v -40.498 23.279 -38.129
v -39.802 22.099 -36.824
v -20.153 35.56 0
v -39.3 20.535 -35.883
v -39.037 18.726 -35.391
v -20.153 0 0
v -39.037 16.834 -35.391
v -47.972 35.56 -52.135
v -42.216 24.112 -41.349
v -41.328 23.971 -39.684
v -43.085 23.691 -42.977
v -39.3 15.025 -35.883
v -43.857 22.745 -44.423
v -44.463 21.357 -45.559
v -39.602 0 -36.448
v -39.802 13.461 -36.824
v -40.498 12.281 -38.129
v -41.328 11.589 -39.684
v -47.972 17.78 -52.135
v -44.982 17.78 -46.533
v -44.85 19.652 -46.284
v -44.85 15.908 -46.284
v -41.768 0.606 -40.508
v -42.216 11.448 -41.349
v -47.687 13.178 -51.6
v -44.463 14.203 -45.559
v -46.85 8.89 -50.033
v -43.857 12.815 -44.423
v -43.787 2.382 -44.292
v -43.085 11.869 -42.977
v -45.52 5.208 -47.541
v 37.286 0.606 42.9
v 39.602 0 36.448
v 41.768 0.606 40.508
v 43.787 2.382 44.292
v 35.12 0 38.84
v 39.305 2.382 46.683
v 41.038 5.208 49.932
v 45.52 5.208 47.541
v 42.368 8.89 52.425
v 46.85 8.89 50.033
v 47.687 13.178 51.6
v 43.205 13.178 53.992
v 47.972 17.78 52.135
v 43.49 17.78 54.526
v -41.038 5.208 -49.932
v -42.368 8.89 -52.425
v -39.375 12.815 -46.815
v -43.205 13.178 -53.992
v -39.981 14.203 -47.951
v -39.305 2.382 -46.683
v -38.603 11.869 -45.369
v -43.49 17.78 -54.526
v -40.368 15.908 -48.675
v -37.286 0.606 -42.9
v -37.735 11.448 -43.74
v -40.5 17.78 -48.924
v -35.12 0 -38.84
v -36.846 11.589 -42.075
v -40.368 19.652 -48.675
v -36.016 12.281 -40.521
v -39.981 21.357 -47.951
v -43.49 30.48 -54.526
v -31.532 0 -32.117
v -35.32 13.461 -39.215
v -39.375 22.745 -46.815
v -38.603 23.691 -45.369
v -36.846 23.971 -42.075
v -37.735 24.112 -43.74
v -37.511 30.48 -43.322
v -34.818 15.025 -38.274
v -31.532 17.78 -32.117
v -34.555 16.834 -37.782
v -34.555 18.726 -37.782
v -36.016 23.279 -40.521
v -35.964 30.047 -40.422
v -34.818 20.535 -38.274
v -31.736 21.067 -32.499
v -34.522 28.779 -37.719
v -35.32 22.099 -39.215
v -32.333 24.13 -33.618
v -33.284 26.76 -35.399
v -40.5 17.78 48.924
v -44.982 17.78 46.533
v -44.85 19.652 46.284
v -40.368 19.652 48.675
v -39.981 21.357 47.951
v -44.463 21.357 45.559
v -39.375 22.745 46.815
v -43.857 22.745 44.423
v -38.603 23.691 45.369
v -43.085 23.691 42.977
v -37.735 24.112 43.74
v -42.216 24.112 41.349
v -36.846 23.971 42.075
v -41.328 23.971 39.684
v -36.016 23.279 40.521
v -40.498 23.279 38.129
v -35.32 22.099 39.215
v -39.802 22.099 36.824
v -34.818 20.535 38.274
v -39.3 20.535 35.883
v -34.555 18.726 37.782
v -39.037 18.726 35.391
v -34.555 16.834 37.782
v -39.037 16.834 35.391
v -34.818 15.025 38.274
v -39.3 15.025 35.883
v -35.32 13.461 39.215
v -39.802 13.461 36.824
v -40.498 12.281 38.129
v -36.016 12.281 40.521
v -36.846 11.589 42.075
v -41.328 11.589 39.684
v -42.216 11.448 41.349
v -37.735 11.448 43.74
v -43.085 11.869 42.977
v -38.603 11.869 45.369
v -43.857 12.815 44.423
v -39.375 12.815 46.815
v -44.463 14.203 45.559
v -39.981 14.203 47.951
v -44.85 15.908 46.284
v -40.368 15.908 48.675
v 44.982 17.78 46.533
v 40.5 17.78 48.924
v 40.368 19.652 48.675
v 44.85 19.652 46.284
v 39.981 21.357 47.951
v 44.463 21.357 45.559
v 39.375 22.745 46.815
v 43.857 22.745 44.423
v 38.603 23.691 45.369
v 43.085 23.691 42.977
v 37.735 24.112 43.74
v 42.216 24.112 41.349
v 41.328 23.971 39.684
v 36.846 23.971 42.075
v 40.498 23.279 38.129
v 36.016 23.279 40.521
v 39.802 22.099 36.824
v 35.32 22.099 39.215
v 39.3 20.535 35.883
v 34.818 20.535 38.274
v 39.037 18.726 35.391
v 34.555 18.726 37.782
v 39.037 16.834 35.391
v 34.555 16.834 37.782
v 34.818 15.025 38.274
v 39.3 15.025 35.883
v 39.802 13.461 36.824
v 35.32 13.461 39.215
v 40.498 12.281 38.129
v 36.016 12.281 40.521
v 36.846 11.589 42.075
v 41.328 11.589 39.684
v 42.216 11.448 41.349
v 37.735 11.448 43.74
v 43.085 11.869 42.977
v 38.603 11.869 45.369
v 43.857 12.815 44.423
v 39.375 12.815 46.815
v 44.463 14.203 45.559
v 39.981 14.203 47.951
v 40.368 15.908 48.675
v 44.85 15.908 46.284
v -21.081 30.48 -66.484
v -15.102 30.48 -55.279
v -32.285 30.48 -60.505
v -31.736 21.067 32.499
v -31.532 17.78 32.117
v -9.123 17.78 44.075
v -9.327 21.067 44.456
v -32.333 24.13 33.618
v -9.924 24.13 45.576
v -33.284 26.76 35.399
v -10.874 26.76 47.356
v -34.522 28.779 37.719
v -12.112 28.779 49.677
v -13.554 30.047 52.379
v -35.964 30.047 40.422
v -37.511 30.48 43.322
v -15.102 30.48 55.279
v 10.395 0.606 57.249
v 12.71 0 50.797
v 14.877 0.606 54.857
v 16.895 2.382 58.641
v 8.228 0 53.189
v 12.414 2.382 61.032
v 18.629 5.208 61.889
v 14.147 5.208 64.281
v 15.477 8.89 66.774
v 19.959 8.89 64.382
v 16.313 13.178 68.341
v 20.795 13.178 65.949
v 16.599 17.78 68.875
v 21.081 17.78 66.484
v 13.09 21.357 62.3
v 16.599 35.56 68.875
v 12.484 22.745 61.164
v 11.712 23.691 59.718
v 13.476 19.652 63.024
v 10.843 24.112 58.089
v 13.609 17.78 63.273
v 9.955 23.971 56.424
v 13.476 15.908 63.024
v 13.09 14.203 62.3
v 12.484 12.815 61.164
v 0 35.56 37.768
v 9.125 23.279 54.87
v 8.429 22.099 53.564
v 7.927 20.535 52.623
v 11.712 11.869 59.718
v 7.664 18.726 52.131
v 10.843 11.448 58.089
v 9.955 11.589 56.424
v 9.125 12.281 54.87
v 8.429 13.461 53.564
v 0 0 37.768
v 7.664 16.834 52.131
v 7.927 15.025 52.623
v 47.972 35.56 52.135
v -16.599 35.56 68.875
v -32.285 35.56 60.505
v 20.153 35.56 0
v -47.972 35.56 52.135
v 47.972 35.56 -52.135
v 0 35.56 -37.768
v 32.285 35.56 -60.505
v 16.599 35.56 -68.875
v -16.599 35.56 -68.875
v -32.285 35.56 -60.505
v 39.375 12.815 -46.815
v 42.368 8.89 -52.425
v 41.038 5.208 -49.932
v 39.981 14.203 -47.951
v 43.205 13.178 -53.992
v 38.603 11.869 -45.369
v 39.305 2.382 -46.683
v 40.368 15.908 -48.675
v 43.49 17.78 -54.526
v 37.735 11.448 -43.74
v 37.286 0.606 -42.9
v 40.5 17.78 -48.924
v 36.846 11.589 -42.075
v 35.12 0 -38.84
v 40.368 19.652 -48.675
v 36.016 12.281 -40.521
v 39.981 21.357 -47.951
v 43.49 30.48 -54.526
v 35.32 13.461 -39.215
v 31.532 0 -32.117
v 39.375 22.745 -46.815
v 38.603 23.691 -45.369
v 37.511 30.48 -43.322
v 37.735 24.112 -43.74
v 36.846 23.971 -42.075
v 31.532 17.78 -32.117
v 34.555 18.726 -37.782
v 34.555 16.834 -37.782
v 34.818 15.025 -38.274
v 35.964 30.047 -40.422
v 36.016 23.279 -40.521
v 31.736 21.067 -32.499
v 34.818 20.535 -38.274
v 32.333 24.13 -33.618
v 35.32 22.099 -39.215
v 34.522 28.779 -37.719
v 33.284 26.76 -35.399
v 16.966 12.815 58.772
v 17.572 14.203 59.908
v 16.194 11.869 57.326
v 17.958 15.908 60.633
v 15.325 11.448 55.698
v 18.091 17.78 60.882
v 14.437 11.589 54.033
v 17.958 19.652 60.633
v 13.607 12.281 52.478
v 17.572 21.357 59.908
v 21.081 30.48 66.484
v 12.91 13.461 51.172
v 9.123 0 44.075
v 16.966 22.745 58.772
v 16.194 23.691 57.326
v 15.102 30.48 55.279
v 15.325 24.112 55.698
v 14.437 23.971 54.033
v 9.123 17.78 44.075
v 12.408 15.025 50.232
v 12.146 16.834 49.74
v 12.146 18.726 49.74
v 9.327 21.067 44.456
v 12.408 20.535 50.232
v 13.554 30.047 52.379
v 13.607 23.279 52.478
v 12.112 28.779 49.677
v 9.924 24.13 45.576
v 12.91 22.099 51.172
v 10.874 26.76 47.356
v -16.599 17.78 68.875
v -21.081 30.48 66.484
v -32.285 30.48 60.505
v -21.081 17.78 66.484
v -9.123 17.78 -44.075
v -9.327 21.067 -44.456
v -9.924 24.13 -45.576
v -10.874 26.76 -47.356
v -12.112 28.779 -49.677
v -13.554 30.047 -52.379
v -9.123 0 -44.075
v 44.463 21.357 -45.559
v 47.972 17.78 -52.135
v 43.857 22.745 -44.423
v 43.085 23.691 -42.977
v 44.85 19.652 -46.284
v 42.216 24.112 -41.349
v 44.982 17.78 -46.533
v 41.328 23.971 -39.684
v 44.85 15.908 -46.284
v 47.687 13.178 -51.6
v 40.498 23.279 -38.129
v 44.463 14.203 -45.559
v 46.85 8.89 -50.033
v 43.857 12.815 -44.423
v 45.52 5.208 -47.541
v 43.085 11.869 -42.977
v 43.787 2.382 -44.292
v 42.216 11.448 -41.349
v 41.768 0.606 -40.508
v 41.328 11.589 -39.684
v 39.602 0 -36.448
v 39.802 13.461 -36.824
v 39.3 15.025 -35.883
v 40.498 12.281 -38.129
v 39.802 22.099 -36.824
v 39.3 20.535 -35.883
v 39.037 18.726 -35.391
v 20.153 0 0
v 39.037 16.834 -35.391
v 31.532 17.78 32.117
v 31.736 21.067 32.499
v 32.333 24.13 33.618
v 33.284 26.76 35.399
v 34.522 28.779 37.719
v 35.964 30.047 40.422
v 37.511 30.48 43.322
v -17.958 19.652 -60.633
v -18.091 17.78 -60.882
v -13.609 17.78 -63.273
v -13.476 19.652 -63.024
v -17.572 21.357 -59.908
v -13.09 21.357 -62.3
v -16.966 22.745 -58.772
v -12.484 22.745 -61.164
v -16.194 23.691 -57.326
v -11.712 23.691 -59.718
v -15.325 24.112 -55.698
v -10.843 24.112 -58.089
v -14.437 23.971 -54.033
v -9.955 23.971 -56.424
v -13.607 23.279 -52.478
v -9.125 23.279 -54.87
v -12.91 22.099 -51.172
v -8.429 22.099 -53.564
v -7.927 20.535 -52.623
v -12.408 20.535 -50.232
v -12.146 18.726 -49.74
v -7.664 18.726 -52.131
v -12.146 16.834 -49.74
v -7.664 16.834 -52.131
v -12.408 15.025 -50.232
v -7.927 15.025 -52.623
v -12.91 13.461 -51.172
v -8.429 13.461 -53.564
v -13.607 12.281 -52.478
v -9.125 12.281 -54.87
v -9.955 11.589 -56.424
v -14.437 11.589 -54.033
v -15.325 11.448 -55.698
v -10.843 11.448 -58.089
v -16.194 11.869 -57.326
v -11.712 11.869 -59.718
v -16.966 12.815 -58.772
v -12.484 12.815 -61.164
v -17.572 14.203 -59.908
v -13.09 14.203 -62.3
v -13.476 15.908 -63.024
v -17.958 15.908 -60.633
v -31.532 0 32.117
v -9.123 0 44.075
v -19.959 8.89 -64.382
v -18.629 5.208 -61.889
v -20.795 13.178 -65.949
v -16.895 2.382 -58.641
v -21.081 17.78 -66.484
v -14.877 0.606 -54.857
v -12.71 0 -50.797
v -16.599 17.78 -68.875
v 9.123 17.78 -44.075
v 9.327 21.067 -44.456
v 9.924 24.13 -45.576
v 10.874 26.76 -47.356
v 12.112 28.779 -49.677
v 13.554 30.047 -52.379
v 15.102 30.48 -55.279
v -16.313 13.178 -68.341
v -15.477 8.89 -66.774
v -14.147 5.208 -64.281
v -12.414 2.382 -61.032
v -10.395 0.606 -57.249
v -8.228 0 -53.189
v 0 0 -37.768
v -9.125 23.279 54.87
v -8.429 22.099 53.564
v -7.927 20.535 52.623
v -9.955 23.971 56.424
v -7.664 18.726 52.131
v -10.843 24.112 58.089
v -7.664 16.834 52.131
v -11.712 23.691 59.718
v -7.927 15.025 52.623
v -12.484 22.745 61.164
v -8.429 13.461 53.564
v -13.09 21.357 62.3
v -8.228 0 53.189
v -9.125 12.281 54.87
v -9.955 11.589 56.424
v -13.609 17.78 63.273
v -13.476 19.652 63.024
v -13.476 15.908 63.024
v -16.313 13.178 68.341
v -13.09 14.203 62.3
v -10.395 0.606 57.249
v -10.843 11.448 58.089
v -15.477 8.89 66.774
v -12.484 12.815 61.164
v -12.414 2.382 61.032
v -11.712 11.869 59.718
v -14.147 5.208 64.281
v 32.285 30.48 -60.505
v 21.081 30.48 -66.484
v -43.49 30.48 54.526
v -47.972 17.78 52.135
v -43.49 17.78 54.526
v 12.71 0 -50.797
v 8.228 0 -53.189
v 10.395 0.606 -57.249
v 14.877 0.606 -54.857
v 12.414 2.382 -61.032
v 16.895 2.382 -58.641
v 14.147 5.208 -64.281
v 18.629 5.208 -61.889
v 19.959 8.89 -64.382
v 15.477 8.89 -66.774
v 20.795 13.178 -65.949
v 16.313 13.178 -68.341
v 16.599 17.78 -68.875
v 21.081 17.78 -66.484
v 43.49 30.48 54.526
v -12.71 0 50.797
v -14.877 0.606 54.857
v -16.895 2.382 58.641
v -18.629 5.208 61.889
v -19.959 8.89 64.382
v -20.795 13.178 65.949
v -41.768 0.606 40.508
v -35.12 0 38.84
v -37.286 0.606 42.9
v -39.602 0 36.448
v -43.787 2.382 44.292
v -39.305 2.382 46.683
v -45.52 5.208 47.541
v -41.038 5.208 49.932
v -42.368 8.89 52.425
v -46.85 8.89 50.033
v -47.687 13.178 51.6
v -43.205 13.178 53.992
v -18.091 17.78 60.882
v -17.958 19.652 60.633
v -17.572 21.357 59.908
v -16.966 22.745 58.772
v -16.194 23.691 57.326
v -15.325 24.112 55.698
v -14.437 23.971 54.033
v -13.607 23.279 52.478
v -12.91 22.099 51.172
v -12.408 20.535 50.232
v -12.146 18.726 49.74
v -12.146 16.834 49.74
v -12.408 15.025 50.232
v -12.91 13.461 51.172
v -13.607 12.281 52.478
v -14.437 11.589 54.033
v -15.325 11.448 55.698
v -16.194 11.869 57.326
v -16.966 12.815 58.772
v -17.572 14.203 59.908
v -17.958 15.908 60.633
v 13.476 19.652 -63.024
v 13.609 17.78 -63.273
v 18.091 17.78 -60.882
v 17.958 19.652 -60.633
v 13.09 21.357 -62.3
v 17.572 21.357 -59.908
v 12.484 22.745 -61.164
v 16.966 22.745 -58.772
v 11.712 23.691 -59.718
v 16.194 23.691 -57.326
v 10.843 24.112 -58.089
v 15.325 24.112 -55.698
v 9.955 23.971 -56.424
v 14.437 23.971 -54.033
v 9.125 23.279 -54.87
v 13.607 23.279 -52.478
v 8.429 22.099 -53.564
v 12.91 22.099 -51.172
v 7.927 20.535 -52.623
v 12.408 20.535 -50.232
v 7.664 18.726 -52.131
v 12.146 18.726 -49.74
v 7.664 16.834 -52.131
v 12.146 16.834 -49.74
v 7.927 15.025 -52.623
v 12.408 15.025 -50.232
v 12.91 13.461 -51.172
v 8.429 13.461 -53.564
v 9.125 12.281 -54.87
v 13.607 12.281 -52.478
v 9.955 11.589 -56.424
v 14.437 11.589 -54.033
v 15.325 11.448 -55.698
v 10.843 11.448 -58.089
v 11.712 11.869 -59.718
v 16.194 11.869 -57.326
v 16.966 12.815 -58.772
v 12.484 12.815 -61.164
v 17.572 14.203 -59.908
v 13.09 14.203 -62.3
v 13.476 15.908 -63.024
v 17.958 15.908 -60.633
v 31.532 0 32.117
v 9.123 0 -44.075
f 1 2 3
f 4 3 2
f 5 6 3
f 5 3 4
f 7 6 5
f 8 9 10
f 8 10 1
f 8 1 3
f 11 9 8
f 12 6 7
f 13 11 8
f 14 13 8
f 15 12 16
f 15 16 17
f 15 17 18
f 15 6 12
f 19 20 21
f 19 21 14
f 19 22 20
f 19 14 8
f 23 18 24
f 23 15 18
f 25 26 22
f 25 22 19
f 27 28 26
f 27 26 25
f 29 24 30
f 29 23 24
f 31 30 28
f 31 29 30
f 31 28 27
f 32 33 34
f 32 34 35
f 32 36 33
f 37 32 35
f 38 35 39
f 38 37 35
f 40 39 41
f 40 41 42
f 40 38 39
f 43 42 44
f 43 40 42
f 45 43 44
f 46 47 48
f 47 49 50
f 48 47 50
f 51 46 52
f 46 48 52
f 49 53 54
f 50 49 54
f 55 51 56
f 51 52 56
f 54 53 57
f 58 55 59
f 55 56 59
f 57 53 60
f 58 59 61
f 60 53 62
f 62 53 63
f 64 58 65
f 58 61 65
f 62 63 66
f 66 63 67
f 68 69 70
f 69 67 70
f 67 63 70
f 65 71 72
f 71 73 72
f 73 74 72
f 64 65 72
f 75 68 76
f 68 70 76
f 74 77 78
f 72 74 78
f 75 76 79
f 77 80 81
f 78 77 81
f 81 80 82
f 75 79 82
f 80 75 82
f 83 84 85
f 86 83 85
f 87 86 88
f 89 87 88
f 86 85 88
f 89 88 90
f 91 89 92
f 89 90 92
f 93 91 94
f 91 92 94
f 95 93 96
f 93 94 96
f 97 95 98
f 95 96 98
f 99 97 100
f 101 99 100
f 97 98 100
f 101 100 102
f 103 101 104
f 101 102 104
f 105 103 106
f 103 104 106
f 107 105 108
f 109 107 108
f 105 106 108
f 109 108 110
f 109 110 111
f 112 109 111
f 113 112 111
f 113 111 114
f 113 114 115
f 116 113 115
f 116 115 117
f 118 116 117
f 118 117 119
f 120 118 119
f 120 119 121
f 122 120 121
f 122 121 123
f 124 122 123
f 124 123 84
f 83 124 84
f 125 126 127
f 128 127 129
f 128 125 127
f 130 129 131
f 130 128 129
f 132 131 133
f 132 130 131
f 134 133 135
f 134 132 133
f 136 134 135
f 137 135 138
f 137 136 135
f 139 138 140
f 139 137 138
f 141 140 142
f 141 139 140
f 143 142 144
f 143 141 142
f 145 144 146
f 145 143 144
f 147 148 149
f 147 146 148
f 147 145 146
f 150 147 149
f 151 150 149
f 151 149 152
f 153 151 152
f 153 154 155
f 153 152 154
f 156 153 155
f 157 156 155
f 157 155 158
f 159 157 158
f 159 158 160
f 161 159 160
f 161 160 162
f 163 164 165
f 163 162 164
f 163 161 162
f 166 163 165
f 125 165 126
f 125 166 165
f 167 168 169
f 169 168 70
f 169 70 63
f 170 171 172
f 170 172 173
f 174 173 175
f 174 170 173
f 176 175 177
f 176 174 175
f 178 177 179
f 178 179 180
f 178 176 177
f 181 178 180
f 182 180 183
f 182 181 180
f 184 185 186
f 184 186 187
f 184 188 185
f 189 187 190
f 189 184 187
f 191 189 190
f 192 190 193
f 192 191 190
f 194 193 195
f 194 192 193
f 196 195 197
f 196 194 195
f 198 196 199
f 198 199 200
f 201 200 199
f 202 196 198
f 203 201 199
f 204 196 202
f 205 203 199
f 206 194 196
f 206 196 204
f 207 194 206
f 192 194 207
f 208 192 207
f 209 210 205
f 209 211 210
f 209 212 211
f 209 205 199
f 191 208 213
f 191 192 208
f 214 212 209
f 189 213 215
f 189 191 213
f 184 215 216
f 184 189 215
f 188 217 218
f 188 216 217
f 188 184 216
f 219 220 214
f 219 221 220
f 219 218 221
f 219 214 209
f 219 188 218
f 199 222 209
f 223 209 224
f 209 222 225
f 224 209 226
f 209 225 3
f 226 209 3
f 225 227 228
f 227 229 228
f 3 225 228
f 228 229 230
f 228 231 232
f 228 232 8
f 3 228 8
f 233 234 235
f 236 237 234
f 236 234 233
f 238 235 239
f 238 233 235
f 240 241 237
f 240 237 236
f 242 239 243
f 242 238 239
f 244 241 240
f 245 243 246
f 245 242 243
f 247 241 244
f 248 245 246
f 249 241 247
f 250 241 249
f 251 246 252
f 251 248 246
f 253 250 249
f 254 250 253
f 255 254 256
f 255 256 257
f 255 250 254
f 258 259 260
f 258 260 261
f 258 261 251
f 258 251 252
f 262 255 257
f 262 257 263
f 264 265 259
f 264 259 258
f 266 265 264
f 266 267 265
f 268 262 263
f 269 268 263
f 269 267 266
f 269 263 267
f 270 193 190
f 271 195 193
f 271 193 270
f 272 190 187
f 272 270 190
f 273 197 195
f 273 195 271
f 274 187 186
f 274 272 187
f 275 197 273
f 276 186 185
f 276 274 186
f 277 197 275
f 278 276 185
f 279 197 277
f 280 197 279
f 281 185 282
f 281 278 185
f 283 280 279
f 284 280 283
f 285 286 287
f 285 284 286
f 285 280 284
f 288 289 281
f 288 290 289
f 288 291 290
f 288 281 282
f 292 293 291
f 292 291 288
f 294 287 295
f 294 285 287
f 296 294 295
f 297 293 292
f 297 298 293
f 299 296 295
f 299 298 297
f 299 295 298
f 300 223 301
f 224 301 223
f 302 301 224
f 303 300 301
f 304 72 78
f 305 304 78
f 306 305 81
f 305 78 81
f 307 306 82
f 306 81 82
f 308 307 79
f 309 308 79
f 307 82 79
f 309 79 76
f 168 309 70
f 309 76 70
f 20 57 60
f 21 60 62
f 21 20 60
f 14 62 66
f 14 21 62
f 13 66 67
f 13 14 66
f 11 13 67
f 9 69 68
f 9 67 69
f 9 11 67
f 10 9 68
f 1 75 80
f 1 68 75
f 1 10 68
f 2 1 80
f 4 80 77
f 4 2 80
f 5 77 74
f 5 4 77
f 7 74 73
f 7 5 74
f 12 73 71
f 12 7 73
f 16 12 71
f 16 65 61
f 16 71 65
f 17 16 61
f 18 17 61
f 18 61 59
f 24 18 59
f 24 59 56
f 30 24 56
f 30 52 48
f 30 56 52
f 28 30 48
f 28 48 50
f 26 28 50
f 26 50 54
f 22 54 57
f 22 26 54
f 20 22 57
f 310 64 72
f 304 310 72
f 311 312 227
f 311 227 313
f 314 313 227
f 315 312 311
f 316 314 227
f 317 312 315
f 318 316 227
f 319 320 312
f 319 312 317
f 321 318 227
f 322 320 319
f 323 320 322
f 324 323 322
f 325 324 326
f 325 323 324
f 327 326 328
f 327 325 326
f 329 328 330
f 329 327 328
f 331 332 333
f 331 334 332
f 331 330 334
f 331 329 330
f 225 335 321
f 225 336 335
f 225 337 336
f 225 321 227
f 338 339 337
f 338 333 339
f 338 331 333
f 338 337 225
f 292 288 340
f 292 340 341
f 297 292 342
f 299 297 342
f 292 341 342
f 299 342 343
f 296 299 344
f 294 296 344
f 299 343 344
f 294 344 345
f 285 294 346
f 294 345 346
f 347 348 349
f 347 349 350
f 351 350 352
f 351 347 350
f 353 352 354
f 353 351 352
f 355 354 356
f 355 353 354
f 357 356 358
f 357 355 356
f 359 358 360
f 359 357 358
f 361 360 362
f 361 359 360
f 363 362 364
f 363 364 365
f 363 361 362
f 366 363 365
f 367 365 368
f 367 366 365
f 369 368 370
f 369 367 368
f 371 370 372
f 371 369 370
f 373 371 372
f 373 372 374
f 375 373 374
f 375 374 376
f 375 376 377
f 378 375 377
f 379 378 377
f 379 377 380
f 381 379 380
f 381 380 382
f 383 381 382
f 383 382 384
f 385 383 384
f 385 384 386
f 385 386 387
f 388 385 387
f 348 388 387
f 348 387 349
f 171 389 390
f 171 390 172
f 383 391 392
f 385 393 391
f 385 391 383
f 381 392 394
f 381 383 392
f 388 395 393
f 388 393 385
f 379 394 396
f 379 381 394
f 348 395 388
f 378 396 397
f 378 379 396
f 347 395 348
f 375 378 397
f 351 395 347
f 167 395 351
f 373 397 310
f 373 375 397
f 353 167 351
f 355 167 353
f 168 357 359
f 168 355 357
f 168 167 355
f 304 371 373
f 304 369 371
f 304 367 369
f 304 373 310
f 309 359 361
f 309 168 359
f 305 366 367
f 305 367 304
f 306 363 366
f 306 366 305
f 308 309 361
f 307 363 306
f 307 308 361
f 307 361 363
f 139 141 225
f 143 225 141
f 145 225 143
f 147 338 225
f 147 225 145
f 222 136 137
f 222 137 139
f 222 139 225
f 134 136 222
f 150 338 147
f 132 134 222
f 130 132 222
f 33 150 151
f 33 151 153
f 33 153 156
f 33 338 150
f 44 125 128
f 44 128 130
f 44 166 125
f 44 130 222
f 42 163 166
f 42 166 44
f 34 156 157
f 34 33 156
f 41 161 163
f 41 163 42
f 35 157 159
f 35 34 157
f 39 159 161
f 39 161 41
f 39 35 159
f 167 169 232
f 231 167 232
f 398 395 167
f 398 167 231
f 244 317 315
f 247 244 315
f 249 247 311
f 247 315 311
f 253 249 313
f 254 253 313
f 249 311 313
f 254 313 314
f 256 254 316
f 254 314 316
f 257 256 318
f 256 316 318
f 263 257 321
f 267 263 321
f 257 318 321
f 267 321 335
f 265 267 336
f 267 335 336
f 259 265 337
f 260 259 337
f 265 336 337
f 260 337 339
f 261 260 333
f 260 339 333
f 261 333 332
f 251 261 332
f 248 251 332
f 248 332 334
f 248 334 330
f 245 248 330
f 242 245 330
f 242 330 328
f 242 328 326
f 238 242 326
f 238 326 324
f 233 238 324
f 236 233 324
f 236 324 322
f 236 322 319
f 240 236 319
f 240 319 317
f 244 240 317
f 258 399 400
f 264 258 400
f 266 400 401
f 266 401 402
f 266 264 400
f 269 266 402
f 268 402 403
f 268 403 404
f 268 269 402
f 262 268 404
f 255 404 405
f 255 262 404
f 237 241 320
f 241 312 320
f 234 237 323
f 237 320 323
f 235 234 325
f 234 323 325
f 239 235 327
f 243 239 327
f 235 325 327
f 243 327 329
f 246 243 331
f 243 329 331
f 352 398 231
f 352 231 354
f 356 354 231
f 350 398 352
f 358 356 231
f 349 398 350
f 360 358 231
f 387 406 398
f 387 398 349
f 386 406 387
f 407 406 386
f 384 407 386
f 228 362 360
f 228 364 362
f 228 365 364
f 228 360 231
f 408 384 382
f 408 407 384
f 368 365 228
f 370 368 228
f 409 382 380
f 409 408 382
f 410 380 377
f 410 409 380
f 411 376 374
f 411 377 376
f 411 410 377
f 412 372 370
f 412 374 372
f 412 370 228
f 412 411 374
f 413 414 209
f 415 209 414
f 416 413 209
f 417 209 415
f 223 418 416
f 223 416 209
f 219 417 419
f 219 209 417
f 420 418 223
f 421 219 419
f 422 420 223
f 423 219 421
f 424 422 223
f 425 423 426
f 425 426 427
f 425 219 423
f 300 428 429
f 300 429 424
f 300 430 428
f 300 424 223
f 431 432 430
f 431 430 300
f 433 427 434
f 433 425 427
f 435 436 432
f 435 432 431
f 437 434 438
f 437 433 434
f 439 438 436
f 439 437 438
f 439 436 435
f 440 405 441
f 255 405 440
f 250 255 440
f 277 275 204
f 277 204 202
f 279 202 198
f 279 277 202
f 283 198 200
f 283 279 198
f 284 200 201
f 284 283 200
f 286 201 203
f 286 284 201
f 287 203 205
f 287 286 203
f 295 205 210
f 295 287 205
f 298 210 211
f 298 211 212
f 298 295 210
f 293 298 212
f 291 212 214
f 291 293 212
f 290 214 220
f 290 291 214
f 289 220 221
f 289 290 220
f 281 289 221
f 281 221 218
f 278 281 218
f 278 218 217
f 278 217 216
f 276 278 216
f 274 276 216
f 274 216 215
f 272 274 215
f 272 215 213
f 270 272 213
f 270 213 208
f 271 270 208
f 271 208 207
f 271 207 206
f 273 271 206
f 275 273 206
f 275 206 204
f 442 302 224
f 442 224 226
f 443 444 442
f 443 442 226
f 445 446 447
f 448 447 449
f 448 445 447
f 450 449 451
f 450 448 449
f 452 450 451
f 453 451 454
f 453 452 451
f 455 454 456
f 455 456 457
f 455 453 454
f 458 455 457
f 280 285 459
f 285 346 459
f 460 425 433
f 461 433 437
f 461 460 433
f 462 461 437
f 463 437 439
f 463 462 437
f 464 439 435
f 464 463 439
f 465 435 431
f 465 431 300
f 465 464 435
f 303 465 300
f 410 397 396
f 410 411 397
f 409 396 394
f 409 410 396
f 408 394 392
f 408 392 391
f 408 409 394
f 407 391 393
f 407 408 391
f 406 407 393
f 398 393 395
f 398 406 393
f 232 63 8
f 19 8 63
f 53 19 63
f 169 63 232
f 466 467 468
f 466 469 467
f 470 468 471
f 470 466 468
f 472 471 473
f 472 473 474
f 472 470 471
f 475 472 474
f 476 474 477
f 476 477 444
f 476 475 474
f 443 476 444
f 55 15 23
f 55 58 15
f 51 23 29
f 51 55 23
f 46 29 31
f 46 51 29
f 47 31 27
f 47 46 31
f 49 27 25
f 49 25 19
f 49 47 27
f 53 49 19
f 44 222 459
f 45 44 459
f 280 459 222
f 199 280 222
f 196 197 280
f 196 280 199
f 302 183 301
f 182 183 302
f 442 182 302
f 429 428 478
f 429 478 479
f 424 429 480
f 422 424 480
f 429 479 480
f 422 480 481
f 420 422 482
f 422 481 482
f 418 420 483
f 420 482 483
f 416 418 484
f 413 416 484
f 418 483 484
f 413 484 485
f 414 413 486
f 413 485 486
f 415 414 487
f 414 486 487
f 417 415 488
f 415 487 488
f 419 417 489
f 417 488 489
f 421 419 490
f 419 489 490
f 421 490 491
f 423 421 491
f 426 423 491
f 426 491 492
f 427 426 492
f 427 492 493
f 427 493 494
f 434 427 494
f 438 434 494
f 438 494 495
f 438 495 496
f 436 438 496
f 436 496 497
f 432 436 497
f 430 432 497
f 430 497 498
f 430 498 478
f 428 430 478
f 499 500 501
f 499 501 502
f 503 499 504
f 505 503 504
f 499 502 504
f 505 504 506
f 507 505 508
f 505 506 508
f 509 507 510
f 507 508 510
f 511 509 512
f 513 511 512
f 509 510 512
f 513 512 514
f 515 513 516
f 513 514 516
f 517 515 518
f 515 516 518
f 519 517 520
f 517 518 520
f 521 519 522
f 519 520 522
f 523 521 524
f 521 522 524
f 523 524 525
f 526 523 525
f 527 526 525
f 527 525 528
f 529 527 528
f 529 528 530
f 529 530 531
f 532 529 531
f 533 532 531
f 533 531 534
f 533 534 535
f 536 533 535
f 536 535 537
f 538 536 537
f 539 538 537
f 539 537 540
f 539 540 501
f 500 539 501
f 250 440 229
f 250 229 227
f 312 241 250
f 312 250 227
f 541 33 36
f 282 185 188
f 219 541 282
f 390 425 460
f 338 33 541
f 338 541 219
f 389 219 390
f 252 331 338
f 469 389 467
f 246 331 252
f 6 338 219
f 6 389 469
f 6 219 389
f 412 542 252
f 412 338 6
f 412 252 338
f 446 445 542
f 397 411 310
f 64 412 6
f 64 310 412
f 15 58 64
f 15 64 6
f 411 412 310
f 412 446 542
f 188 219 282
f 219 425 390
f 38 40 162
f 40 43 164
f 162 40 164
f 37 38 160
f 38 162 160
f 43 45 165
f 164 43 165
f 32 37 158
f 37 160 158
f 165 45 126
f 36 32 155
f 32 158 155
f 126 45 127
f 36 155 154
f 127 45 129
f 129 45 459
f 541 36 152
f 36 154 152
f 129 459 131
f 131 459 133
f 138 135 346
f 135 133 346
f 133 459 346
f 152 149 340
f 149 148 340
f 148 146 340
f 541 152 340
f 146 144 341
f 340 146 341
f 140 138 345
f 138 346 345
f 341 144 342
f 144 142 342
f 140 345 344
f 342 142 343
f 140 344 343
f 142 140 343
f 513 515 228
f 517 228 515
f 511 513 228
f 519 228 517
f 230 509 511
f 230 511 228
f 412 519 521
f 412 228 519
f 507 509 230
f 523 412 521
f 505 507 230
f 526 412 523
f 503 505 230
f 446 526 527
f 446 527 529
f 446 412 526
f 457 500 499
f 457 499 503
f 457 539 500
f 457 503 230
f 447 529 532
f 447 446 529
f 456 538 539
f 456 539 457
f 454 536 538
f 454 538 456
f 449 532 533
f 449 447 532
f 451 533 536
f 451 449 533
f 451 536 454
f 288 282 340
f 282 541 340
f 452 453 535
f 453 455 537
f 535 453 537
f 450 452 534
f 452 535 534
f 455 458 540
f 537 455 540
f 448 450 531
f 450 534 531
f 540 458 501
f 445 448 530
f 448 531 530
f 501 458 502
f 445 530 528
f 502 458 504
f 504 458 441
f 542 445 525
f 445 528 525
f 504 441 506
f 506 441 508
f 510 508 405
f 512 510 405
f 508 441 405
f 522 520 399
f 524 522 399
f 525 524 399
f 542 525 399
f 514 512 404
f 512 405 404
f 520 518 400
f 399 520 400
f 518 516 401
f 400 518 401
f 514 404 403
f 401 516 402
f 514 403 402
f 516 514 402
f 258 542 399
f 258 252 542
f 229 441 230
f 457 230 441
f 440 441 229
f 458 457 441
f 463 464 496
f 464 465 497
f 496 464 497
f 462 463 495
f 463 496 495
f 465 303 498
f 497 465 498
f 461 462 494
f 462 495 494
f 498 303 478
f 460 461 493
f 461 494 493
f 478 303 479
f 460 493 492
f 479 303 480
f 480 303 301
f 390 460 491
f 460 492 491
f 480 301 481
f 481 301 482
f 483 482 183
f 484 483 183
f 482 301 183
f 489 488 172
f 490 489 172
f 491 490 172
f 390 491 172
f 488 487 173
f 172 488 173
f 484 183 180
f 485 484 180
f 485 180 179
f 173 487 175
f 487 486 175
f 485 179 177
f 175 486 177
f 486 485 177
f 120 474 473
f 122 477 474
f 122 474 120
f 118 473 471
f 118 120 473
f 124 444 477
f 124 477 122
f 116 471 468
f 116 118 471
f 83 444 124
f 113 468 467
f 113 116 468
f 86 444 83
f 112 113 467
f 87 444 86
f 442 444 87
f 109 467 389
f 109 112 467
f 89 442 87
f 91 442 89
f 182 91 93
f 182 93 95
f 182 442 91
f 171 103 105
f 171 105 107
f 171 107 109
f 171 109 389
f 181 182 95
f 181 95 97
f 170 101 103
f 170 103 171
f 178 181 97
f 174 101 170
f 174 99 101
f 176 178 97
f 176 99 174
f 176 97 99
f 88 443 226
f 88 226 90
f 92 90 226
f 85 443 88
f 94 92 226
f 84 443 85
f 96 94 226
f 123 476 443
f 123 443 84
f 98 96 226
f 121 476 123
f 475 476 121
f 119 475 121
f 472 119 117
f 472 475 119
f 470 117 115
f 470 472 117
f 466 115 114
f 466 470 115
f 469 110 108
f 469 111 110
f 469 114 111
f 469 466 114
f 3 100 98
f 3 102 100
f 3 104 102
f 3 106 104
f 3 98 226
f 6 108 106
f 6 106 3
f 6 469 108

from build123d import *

# Parameters (mm, degrees)
BOSS_EXTRUDE1_DEPTH       = 35.56
CORTAR_EXTRUIR1_DEPTH     = 12.7
CORTAR_EXTRUIR2_DEPTH     = 12.7
CROQUIS4_R                = 6.35
CORTAR_EXTRUIR3_DEPTH     = 35.56
SIMETR_A7_COPY_1_SKETCH_R = 6.35
SIMETR_A7_COPY_1_DEPTH    = 35.56
REDONDEO1_R               = 17.78


with BuildPart() as part:
    # Sketch1 → Boss-Extrude1 (new body)
    with BuildSketch(Plane(origin=(0, 0, 0), x_dir=(1, 0, 0), z_dir=(0, 1, 0))):
        Polygon((47.97173767, 52.13499004), (20.15284418, 0), (47.971737664, -52.13499003), (16.598657301, -68.875462799), (0, -37.768156774), (-16.598657301, -68.875462799), (-32.285197483, -60.505226415), (-47.971737664, -52.13499003), (-20.15284418, 0), (-47.971737664, 52.13499003), (-32.285197483, 60.505226415), (-16.598657301, 68.875462799), (0, 37.768156774), (16.598657296, 68.875462789), (32.28519748, 60.505226416), align=None)
    extrude(amount=BOSS_EXTRUDE1_DEPTH)

    # Croquis2 → Cortar-Extruir1 (cut, symmetric)
    with BuildSketch(Plane(origin=(0, 0, 0), x_dir=(-0.470766951, 0, 0.882257603), z_dir=(-0.882257603, 0, -0.470766951))):
        with BuildLine():
            Line((55.88, 30.48), (68.58, 30.48))
            Line((68.58, 30.48), (68.58, 0))
            Line((68.58, 0), (43.18, 0))
            Line((43.18, 0), (43.18, 17.78))
            ThreePointArc((43.18, 17.78), (46.899743879, 26.760256121), (55.88, 30.48))
        make_face()
    cortar_extruir1 = extrude(amount=CORTAR_EXTRUIR1_DEPTH, both=True, mode=Mode.SUBTRACT)

    # Croquis3 → Cortar-Extruir2 (cut, symmetric)
    with BuildSketch(Plane(origin=(0, 0, 0), x_dir=(-0.470766951, 0, -0.882257603), z_dir=(0.882257603, 0, -0.470766951))):
        with BuildLine():
            Line((-55.88, 30.48), (-68.58, 30.48))
            Line((-68.58, 30.48), (-68.58, 0))
            Line((-68.58, 0), (-43.18, 0))
            Line((-43.18, 0), (-43.18, 17.78))
            ThreePointArc((-43.18, 17.78), (-46.899743879, 26.760256121), (-55.88, 30.48))
        make_face()
    cortar_extruir2 = extrude(amount=CORTAR_EXTRUIR2_DEPTH, both=True, mode=Mode.SUBTRACT)

    # Simetría1: Cortar-Extruir1, Cortar-Extruir2 across plane
    add(cortar_extruir1.mirror(Plane.XY), mode=Mode.SUBTRACT)
    add(cortar_extruir2.mirror(Plane.XY), mode=Mode.SUBTRACT)

    # Croquis4 → Cortar-Extruir3 (cut)
    with BuildSketch(Plane(origin=(-15.686540182, 0, -8.370236384), x_dir=(-0.470766951, 0, 0.882257603), z_dir=(-0.882257603, 0, -0.470766951))):
        with Locations((55.88, 17.78)):
            Circle(CROQUIS4_R)
    cortar_extruir3 = extrude(amount=-CORTAR_EXTRUIR3_DEPTH, mode=Mode.SUBTRACT)

    # Simetría2: Cortar-Extruir3 across plane
    add(cortar_extruir3.mirror(Plane(origin=(0, 0, 0), x_dir=(0, 0, 1), z_dir=(1, 0, 0))), mode=Mode.SUBTRACT)

    # Simetría7: Cortar-Extruir3 across plane
    add(cortar_extruir3.mirror(Plane.XY), mode=Mode.SUBTRACT)

    # Simetría7 copy 1 sketch → Simetría7 copy 1 (cut)
    with BuildSketch(Plane(origin=(15.686540182, 0, 8.370236384), x_dir=(0.470766951, 0, -0.882257603), z_dir=(0.882257603, 0, 0.470766951))):
        with Locations((55.88, 17.78)):
            Circle(SIMETR_A7_COPY_1_SKETCH_R)
    extrude(amount=-SIMETR_A7_COPY_1_DEPTH, mode=Mode.SUBTRACT)

    # Redondeo1
    redondeo1_edges = [part.edges().sort_by_distance(p)[0] for p in [
        (18.839591613, 0, 67.679714744),
        (-45.730803353, 0, 53.330738085),
        (-18.839591613, 0, -67.679714744),
        (45.730803357, 0, -53.330738094),
        (-18.839591613, 0, 67.679714744),
        (45.730803353, 0, 53.330738085),
        (-45.730803353, 0, -53.330738085),
        (18.839591608, 0, -67.679714736),
    ]]
    fillet(redondeo1_edges, radius=REDONDEO1_R)


solid = part.part
